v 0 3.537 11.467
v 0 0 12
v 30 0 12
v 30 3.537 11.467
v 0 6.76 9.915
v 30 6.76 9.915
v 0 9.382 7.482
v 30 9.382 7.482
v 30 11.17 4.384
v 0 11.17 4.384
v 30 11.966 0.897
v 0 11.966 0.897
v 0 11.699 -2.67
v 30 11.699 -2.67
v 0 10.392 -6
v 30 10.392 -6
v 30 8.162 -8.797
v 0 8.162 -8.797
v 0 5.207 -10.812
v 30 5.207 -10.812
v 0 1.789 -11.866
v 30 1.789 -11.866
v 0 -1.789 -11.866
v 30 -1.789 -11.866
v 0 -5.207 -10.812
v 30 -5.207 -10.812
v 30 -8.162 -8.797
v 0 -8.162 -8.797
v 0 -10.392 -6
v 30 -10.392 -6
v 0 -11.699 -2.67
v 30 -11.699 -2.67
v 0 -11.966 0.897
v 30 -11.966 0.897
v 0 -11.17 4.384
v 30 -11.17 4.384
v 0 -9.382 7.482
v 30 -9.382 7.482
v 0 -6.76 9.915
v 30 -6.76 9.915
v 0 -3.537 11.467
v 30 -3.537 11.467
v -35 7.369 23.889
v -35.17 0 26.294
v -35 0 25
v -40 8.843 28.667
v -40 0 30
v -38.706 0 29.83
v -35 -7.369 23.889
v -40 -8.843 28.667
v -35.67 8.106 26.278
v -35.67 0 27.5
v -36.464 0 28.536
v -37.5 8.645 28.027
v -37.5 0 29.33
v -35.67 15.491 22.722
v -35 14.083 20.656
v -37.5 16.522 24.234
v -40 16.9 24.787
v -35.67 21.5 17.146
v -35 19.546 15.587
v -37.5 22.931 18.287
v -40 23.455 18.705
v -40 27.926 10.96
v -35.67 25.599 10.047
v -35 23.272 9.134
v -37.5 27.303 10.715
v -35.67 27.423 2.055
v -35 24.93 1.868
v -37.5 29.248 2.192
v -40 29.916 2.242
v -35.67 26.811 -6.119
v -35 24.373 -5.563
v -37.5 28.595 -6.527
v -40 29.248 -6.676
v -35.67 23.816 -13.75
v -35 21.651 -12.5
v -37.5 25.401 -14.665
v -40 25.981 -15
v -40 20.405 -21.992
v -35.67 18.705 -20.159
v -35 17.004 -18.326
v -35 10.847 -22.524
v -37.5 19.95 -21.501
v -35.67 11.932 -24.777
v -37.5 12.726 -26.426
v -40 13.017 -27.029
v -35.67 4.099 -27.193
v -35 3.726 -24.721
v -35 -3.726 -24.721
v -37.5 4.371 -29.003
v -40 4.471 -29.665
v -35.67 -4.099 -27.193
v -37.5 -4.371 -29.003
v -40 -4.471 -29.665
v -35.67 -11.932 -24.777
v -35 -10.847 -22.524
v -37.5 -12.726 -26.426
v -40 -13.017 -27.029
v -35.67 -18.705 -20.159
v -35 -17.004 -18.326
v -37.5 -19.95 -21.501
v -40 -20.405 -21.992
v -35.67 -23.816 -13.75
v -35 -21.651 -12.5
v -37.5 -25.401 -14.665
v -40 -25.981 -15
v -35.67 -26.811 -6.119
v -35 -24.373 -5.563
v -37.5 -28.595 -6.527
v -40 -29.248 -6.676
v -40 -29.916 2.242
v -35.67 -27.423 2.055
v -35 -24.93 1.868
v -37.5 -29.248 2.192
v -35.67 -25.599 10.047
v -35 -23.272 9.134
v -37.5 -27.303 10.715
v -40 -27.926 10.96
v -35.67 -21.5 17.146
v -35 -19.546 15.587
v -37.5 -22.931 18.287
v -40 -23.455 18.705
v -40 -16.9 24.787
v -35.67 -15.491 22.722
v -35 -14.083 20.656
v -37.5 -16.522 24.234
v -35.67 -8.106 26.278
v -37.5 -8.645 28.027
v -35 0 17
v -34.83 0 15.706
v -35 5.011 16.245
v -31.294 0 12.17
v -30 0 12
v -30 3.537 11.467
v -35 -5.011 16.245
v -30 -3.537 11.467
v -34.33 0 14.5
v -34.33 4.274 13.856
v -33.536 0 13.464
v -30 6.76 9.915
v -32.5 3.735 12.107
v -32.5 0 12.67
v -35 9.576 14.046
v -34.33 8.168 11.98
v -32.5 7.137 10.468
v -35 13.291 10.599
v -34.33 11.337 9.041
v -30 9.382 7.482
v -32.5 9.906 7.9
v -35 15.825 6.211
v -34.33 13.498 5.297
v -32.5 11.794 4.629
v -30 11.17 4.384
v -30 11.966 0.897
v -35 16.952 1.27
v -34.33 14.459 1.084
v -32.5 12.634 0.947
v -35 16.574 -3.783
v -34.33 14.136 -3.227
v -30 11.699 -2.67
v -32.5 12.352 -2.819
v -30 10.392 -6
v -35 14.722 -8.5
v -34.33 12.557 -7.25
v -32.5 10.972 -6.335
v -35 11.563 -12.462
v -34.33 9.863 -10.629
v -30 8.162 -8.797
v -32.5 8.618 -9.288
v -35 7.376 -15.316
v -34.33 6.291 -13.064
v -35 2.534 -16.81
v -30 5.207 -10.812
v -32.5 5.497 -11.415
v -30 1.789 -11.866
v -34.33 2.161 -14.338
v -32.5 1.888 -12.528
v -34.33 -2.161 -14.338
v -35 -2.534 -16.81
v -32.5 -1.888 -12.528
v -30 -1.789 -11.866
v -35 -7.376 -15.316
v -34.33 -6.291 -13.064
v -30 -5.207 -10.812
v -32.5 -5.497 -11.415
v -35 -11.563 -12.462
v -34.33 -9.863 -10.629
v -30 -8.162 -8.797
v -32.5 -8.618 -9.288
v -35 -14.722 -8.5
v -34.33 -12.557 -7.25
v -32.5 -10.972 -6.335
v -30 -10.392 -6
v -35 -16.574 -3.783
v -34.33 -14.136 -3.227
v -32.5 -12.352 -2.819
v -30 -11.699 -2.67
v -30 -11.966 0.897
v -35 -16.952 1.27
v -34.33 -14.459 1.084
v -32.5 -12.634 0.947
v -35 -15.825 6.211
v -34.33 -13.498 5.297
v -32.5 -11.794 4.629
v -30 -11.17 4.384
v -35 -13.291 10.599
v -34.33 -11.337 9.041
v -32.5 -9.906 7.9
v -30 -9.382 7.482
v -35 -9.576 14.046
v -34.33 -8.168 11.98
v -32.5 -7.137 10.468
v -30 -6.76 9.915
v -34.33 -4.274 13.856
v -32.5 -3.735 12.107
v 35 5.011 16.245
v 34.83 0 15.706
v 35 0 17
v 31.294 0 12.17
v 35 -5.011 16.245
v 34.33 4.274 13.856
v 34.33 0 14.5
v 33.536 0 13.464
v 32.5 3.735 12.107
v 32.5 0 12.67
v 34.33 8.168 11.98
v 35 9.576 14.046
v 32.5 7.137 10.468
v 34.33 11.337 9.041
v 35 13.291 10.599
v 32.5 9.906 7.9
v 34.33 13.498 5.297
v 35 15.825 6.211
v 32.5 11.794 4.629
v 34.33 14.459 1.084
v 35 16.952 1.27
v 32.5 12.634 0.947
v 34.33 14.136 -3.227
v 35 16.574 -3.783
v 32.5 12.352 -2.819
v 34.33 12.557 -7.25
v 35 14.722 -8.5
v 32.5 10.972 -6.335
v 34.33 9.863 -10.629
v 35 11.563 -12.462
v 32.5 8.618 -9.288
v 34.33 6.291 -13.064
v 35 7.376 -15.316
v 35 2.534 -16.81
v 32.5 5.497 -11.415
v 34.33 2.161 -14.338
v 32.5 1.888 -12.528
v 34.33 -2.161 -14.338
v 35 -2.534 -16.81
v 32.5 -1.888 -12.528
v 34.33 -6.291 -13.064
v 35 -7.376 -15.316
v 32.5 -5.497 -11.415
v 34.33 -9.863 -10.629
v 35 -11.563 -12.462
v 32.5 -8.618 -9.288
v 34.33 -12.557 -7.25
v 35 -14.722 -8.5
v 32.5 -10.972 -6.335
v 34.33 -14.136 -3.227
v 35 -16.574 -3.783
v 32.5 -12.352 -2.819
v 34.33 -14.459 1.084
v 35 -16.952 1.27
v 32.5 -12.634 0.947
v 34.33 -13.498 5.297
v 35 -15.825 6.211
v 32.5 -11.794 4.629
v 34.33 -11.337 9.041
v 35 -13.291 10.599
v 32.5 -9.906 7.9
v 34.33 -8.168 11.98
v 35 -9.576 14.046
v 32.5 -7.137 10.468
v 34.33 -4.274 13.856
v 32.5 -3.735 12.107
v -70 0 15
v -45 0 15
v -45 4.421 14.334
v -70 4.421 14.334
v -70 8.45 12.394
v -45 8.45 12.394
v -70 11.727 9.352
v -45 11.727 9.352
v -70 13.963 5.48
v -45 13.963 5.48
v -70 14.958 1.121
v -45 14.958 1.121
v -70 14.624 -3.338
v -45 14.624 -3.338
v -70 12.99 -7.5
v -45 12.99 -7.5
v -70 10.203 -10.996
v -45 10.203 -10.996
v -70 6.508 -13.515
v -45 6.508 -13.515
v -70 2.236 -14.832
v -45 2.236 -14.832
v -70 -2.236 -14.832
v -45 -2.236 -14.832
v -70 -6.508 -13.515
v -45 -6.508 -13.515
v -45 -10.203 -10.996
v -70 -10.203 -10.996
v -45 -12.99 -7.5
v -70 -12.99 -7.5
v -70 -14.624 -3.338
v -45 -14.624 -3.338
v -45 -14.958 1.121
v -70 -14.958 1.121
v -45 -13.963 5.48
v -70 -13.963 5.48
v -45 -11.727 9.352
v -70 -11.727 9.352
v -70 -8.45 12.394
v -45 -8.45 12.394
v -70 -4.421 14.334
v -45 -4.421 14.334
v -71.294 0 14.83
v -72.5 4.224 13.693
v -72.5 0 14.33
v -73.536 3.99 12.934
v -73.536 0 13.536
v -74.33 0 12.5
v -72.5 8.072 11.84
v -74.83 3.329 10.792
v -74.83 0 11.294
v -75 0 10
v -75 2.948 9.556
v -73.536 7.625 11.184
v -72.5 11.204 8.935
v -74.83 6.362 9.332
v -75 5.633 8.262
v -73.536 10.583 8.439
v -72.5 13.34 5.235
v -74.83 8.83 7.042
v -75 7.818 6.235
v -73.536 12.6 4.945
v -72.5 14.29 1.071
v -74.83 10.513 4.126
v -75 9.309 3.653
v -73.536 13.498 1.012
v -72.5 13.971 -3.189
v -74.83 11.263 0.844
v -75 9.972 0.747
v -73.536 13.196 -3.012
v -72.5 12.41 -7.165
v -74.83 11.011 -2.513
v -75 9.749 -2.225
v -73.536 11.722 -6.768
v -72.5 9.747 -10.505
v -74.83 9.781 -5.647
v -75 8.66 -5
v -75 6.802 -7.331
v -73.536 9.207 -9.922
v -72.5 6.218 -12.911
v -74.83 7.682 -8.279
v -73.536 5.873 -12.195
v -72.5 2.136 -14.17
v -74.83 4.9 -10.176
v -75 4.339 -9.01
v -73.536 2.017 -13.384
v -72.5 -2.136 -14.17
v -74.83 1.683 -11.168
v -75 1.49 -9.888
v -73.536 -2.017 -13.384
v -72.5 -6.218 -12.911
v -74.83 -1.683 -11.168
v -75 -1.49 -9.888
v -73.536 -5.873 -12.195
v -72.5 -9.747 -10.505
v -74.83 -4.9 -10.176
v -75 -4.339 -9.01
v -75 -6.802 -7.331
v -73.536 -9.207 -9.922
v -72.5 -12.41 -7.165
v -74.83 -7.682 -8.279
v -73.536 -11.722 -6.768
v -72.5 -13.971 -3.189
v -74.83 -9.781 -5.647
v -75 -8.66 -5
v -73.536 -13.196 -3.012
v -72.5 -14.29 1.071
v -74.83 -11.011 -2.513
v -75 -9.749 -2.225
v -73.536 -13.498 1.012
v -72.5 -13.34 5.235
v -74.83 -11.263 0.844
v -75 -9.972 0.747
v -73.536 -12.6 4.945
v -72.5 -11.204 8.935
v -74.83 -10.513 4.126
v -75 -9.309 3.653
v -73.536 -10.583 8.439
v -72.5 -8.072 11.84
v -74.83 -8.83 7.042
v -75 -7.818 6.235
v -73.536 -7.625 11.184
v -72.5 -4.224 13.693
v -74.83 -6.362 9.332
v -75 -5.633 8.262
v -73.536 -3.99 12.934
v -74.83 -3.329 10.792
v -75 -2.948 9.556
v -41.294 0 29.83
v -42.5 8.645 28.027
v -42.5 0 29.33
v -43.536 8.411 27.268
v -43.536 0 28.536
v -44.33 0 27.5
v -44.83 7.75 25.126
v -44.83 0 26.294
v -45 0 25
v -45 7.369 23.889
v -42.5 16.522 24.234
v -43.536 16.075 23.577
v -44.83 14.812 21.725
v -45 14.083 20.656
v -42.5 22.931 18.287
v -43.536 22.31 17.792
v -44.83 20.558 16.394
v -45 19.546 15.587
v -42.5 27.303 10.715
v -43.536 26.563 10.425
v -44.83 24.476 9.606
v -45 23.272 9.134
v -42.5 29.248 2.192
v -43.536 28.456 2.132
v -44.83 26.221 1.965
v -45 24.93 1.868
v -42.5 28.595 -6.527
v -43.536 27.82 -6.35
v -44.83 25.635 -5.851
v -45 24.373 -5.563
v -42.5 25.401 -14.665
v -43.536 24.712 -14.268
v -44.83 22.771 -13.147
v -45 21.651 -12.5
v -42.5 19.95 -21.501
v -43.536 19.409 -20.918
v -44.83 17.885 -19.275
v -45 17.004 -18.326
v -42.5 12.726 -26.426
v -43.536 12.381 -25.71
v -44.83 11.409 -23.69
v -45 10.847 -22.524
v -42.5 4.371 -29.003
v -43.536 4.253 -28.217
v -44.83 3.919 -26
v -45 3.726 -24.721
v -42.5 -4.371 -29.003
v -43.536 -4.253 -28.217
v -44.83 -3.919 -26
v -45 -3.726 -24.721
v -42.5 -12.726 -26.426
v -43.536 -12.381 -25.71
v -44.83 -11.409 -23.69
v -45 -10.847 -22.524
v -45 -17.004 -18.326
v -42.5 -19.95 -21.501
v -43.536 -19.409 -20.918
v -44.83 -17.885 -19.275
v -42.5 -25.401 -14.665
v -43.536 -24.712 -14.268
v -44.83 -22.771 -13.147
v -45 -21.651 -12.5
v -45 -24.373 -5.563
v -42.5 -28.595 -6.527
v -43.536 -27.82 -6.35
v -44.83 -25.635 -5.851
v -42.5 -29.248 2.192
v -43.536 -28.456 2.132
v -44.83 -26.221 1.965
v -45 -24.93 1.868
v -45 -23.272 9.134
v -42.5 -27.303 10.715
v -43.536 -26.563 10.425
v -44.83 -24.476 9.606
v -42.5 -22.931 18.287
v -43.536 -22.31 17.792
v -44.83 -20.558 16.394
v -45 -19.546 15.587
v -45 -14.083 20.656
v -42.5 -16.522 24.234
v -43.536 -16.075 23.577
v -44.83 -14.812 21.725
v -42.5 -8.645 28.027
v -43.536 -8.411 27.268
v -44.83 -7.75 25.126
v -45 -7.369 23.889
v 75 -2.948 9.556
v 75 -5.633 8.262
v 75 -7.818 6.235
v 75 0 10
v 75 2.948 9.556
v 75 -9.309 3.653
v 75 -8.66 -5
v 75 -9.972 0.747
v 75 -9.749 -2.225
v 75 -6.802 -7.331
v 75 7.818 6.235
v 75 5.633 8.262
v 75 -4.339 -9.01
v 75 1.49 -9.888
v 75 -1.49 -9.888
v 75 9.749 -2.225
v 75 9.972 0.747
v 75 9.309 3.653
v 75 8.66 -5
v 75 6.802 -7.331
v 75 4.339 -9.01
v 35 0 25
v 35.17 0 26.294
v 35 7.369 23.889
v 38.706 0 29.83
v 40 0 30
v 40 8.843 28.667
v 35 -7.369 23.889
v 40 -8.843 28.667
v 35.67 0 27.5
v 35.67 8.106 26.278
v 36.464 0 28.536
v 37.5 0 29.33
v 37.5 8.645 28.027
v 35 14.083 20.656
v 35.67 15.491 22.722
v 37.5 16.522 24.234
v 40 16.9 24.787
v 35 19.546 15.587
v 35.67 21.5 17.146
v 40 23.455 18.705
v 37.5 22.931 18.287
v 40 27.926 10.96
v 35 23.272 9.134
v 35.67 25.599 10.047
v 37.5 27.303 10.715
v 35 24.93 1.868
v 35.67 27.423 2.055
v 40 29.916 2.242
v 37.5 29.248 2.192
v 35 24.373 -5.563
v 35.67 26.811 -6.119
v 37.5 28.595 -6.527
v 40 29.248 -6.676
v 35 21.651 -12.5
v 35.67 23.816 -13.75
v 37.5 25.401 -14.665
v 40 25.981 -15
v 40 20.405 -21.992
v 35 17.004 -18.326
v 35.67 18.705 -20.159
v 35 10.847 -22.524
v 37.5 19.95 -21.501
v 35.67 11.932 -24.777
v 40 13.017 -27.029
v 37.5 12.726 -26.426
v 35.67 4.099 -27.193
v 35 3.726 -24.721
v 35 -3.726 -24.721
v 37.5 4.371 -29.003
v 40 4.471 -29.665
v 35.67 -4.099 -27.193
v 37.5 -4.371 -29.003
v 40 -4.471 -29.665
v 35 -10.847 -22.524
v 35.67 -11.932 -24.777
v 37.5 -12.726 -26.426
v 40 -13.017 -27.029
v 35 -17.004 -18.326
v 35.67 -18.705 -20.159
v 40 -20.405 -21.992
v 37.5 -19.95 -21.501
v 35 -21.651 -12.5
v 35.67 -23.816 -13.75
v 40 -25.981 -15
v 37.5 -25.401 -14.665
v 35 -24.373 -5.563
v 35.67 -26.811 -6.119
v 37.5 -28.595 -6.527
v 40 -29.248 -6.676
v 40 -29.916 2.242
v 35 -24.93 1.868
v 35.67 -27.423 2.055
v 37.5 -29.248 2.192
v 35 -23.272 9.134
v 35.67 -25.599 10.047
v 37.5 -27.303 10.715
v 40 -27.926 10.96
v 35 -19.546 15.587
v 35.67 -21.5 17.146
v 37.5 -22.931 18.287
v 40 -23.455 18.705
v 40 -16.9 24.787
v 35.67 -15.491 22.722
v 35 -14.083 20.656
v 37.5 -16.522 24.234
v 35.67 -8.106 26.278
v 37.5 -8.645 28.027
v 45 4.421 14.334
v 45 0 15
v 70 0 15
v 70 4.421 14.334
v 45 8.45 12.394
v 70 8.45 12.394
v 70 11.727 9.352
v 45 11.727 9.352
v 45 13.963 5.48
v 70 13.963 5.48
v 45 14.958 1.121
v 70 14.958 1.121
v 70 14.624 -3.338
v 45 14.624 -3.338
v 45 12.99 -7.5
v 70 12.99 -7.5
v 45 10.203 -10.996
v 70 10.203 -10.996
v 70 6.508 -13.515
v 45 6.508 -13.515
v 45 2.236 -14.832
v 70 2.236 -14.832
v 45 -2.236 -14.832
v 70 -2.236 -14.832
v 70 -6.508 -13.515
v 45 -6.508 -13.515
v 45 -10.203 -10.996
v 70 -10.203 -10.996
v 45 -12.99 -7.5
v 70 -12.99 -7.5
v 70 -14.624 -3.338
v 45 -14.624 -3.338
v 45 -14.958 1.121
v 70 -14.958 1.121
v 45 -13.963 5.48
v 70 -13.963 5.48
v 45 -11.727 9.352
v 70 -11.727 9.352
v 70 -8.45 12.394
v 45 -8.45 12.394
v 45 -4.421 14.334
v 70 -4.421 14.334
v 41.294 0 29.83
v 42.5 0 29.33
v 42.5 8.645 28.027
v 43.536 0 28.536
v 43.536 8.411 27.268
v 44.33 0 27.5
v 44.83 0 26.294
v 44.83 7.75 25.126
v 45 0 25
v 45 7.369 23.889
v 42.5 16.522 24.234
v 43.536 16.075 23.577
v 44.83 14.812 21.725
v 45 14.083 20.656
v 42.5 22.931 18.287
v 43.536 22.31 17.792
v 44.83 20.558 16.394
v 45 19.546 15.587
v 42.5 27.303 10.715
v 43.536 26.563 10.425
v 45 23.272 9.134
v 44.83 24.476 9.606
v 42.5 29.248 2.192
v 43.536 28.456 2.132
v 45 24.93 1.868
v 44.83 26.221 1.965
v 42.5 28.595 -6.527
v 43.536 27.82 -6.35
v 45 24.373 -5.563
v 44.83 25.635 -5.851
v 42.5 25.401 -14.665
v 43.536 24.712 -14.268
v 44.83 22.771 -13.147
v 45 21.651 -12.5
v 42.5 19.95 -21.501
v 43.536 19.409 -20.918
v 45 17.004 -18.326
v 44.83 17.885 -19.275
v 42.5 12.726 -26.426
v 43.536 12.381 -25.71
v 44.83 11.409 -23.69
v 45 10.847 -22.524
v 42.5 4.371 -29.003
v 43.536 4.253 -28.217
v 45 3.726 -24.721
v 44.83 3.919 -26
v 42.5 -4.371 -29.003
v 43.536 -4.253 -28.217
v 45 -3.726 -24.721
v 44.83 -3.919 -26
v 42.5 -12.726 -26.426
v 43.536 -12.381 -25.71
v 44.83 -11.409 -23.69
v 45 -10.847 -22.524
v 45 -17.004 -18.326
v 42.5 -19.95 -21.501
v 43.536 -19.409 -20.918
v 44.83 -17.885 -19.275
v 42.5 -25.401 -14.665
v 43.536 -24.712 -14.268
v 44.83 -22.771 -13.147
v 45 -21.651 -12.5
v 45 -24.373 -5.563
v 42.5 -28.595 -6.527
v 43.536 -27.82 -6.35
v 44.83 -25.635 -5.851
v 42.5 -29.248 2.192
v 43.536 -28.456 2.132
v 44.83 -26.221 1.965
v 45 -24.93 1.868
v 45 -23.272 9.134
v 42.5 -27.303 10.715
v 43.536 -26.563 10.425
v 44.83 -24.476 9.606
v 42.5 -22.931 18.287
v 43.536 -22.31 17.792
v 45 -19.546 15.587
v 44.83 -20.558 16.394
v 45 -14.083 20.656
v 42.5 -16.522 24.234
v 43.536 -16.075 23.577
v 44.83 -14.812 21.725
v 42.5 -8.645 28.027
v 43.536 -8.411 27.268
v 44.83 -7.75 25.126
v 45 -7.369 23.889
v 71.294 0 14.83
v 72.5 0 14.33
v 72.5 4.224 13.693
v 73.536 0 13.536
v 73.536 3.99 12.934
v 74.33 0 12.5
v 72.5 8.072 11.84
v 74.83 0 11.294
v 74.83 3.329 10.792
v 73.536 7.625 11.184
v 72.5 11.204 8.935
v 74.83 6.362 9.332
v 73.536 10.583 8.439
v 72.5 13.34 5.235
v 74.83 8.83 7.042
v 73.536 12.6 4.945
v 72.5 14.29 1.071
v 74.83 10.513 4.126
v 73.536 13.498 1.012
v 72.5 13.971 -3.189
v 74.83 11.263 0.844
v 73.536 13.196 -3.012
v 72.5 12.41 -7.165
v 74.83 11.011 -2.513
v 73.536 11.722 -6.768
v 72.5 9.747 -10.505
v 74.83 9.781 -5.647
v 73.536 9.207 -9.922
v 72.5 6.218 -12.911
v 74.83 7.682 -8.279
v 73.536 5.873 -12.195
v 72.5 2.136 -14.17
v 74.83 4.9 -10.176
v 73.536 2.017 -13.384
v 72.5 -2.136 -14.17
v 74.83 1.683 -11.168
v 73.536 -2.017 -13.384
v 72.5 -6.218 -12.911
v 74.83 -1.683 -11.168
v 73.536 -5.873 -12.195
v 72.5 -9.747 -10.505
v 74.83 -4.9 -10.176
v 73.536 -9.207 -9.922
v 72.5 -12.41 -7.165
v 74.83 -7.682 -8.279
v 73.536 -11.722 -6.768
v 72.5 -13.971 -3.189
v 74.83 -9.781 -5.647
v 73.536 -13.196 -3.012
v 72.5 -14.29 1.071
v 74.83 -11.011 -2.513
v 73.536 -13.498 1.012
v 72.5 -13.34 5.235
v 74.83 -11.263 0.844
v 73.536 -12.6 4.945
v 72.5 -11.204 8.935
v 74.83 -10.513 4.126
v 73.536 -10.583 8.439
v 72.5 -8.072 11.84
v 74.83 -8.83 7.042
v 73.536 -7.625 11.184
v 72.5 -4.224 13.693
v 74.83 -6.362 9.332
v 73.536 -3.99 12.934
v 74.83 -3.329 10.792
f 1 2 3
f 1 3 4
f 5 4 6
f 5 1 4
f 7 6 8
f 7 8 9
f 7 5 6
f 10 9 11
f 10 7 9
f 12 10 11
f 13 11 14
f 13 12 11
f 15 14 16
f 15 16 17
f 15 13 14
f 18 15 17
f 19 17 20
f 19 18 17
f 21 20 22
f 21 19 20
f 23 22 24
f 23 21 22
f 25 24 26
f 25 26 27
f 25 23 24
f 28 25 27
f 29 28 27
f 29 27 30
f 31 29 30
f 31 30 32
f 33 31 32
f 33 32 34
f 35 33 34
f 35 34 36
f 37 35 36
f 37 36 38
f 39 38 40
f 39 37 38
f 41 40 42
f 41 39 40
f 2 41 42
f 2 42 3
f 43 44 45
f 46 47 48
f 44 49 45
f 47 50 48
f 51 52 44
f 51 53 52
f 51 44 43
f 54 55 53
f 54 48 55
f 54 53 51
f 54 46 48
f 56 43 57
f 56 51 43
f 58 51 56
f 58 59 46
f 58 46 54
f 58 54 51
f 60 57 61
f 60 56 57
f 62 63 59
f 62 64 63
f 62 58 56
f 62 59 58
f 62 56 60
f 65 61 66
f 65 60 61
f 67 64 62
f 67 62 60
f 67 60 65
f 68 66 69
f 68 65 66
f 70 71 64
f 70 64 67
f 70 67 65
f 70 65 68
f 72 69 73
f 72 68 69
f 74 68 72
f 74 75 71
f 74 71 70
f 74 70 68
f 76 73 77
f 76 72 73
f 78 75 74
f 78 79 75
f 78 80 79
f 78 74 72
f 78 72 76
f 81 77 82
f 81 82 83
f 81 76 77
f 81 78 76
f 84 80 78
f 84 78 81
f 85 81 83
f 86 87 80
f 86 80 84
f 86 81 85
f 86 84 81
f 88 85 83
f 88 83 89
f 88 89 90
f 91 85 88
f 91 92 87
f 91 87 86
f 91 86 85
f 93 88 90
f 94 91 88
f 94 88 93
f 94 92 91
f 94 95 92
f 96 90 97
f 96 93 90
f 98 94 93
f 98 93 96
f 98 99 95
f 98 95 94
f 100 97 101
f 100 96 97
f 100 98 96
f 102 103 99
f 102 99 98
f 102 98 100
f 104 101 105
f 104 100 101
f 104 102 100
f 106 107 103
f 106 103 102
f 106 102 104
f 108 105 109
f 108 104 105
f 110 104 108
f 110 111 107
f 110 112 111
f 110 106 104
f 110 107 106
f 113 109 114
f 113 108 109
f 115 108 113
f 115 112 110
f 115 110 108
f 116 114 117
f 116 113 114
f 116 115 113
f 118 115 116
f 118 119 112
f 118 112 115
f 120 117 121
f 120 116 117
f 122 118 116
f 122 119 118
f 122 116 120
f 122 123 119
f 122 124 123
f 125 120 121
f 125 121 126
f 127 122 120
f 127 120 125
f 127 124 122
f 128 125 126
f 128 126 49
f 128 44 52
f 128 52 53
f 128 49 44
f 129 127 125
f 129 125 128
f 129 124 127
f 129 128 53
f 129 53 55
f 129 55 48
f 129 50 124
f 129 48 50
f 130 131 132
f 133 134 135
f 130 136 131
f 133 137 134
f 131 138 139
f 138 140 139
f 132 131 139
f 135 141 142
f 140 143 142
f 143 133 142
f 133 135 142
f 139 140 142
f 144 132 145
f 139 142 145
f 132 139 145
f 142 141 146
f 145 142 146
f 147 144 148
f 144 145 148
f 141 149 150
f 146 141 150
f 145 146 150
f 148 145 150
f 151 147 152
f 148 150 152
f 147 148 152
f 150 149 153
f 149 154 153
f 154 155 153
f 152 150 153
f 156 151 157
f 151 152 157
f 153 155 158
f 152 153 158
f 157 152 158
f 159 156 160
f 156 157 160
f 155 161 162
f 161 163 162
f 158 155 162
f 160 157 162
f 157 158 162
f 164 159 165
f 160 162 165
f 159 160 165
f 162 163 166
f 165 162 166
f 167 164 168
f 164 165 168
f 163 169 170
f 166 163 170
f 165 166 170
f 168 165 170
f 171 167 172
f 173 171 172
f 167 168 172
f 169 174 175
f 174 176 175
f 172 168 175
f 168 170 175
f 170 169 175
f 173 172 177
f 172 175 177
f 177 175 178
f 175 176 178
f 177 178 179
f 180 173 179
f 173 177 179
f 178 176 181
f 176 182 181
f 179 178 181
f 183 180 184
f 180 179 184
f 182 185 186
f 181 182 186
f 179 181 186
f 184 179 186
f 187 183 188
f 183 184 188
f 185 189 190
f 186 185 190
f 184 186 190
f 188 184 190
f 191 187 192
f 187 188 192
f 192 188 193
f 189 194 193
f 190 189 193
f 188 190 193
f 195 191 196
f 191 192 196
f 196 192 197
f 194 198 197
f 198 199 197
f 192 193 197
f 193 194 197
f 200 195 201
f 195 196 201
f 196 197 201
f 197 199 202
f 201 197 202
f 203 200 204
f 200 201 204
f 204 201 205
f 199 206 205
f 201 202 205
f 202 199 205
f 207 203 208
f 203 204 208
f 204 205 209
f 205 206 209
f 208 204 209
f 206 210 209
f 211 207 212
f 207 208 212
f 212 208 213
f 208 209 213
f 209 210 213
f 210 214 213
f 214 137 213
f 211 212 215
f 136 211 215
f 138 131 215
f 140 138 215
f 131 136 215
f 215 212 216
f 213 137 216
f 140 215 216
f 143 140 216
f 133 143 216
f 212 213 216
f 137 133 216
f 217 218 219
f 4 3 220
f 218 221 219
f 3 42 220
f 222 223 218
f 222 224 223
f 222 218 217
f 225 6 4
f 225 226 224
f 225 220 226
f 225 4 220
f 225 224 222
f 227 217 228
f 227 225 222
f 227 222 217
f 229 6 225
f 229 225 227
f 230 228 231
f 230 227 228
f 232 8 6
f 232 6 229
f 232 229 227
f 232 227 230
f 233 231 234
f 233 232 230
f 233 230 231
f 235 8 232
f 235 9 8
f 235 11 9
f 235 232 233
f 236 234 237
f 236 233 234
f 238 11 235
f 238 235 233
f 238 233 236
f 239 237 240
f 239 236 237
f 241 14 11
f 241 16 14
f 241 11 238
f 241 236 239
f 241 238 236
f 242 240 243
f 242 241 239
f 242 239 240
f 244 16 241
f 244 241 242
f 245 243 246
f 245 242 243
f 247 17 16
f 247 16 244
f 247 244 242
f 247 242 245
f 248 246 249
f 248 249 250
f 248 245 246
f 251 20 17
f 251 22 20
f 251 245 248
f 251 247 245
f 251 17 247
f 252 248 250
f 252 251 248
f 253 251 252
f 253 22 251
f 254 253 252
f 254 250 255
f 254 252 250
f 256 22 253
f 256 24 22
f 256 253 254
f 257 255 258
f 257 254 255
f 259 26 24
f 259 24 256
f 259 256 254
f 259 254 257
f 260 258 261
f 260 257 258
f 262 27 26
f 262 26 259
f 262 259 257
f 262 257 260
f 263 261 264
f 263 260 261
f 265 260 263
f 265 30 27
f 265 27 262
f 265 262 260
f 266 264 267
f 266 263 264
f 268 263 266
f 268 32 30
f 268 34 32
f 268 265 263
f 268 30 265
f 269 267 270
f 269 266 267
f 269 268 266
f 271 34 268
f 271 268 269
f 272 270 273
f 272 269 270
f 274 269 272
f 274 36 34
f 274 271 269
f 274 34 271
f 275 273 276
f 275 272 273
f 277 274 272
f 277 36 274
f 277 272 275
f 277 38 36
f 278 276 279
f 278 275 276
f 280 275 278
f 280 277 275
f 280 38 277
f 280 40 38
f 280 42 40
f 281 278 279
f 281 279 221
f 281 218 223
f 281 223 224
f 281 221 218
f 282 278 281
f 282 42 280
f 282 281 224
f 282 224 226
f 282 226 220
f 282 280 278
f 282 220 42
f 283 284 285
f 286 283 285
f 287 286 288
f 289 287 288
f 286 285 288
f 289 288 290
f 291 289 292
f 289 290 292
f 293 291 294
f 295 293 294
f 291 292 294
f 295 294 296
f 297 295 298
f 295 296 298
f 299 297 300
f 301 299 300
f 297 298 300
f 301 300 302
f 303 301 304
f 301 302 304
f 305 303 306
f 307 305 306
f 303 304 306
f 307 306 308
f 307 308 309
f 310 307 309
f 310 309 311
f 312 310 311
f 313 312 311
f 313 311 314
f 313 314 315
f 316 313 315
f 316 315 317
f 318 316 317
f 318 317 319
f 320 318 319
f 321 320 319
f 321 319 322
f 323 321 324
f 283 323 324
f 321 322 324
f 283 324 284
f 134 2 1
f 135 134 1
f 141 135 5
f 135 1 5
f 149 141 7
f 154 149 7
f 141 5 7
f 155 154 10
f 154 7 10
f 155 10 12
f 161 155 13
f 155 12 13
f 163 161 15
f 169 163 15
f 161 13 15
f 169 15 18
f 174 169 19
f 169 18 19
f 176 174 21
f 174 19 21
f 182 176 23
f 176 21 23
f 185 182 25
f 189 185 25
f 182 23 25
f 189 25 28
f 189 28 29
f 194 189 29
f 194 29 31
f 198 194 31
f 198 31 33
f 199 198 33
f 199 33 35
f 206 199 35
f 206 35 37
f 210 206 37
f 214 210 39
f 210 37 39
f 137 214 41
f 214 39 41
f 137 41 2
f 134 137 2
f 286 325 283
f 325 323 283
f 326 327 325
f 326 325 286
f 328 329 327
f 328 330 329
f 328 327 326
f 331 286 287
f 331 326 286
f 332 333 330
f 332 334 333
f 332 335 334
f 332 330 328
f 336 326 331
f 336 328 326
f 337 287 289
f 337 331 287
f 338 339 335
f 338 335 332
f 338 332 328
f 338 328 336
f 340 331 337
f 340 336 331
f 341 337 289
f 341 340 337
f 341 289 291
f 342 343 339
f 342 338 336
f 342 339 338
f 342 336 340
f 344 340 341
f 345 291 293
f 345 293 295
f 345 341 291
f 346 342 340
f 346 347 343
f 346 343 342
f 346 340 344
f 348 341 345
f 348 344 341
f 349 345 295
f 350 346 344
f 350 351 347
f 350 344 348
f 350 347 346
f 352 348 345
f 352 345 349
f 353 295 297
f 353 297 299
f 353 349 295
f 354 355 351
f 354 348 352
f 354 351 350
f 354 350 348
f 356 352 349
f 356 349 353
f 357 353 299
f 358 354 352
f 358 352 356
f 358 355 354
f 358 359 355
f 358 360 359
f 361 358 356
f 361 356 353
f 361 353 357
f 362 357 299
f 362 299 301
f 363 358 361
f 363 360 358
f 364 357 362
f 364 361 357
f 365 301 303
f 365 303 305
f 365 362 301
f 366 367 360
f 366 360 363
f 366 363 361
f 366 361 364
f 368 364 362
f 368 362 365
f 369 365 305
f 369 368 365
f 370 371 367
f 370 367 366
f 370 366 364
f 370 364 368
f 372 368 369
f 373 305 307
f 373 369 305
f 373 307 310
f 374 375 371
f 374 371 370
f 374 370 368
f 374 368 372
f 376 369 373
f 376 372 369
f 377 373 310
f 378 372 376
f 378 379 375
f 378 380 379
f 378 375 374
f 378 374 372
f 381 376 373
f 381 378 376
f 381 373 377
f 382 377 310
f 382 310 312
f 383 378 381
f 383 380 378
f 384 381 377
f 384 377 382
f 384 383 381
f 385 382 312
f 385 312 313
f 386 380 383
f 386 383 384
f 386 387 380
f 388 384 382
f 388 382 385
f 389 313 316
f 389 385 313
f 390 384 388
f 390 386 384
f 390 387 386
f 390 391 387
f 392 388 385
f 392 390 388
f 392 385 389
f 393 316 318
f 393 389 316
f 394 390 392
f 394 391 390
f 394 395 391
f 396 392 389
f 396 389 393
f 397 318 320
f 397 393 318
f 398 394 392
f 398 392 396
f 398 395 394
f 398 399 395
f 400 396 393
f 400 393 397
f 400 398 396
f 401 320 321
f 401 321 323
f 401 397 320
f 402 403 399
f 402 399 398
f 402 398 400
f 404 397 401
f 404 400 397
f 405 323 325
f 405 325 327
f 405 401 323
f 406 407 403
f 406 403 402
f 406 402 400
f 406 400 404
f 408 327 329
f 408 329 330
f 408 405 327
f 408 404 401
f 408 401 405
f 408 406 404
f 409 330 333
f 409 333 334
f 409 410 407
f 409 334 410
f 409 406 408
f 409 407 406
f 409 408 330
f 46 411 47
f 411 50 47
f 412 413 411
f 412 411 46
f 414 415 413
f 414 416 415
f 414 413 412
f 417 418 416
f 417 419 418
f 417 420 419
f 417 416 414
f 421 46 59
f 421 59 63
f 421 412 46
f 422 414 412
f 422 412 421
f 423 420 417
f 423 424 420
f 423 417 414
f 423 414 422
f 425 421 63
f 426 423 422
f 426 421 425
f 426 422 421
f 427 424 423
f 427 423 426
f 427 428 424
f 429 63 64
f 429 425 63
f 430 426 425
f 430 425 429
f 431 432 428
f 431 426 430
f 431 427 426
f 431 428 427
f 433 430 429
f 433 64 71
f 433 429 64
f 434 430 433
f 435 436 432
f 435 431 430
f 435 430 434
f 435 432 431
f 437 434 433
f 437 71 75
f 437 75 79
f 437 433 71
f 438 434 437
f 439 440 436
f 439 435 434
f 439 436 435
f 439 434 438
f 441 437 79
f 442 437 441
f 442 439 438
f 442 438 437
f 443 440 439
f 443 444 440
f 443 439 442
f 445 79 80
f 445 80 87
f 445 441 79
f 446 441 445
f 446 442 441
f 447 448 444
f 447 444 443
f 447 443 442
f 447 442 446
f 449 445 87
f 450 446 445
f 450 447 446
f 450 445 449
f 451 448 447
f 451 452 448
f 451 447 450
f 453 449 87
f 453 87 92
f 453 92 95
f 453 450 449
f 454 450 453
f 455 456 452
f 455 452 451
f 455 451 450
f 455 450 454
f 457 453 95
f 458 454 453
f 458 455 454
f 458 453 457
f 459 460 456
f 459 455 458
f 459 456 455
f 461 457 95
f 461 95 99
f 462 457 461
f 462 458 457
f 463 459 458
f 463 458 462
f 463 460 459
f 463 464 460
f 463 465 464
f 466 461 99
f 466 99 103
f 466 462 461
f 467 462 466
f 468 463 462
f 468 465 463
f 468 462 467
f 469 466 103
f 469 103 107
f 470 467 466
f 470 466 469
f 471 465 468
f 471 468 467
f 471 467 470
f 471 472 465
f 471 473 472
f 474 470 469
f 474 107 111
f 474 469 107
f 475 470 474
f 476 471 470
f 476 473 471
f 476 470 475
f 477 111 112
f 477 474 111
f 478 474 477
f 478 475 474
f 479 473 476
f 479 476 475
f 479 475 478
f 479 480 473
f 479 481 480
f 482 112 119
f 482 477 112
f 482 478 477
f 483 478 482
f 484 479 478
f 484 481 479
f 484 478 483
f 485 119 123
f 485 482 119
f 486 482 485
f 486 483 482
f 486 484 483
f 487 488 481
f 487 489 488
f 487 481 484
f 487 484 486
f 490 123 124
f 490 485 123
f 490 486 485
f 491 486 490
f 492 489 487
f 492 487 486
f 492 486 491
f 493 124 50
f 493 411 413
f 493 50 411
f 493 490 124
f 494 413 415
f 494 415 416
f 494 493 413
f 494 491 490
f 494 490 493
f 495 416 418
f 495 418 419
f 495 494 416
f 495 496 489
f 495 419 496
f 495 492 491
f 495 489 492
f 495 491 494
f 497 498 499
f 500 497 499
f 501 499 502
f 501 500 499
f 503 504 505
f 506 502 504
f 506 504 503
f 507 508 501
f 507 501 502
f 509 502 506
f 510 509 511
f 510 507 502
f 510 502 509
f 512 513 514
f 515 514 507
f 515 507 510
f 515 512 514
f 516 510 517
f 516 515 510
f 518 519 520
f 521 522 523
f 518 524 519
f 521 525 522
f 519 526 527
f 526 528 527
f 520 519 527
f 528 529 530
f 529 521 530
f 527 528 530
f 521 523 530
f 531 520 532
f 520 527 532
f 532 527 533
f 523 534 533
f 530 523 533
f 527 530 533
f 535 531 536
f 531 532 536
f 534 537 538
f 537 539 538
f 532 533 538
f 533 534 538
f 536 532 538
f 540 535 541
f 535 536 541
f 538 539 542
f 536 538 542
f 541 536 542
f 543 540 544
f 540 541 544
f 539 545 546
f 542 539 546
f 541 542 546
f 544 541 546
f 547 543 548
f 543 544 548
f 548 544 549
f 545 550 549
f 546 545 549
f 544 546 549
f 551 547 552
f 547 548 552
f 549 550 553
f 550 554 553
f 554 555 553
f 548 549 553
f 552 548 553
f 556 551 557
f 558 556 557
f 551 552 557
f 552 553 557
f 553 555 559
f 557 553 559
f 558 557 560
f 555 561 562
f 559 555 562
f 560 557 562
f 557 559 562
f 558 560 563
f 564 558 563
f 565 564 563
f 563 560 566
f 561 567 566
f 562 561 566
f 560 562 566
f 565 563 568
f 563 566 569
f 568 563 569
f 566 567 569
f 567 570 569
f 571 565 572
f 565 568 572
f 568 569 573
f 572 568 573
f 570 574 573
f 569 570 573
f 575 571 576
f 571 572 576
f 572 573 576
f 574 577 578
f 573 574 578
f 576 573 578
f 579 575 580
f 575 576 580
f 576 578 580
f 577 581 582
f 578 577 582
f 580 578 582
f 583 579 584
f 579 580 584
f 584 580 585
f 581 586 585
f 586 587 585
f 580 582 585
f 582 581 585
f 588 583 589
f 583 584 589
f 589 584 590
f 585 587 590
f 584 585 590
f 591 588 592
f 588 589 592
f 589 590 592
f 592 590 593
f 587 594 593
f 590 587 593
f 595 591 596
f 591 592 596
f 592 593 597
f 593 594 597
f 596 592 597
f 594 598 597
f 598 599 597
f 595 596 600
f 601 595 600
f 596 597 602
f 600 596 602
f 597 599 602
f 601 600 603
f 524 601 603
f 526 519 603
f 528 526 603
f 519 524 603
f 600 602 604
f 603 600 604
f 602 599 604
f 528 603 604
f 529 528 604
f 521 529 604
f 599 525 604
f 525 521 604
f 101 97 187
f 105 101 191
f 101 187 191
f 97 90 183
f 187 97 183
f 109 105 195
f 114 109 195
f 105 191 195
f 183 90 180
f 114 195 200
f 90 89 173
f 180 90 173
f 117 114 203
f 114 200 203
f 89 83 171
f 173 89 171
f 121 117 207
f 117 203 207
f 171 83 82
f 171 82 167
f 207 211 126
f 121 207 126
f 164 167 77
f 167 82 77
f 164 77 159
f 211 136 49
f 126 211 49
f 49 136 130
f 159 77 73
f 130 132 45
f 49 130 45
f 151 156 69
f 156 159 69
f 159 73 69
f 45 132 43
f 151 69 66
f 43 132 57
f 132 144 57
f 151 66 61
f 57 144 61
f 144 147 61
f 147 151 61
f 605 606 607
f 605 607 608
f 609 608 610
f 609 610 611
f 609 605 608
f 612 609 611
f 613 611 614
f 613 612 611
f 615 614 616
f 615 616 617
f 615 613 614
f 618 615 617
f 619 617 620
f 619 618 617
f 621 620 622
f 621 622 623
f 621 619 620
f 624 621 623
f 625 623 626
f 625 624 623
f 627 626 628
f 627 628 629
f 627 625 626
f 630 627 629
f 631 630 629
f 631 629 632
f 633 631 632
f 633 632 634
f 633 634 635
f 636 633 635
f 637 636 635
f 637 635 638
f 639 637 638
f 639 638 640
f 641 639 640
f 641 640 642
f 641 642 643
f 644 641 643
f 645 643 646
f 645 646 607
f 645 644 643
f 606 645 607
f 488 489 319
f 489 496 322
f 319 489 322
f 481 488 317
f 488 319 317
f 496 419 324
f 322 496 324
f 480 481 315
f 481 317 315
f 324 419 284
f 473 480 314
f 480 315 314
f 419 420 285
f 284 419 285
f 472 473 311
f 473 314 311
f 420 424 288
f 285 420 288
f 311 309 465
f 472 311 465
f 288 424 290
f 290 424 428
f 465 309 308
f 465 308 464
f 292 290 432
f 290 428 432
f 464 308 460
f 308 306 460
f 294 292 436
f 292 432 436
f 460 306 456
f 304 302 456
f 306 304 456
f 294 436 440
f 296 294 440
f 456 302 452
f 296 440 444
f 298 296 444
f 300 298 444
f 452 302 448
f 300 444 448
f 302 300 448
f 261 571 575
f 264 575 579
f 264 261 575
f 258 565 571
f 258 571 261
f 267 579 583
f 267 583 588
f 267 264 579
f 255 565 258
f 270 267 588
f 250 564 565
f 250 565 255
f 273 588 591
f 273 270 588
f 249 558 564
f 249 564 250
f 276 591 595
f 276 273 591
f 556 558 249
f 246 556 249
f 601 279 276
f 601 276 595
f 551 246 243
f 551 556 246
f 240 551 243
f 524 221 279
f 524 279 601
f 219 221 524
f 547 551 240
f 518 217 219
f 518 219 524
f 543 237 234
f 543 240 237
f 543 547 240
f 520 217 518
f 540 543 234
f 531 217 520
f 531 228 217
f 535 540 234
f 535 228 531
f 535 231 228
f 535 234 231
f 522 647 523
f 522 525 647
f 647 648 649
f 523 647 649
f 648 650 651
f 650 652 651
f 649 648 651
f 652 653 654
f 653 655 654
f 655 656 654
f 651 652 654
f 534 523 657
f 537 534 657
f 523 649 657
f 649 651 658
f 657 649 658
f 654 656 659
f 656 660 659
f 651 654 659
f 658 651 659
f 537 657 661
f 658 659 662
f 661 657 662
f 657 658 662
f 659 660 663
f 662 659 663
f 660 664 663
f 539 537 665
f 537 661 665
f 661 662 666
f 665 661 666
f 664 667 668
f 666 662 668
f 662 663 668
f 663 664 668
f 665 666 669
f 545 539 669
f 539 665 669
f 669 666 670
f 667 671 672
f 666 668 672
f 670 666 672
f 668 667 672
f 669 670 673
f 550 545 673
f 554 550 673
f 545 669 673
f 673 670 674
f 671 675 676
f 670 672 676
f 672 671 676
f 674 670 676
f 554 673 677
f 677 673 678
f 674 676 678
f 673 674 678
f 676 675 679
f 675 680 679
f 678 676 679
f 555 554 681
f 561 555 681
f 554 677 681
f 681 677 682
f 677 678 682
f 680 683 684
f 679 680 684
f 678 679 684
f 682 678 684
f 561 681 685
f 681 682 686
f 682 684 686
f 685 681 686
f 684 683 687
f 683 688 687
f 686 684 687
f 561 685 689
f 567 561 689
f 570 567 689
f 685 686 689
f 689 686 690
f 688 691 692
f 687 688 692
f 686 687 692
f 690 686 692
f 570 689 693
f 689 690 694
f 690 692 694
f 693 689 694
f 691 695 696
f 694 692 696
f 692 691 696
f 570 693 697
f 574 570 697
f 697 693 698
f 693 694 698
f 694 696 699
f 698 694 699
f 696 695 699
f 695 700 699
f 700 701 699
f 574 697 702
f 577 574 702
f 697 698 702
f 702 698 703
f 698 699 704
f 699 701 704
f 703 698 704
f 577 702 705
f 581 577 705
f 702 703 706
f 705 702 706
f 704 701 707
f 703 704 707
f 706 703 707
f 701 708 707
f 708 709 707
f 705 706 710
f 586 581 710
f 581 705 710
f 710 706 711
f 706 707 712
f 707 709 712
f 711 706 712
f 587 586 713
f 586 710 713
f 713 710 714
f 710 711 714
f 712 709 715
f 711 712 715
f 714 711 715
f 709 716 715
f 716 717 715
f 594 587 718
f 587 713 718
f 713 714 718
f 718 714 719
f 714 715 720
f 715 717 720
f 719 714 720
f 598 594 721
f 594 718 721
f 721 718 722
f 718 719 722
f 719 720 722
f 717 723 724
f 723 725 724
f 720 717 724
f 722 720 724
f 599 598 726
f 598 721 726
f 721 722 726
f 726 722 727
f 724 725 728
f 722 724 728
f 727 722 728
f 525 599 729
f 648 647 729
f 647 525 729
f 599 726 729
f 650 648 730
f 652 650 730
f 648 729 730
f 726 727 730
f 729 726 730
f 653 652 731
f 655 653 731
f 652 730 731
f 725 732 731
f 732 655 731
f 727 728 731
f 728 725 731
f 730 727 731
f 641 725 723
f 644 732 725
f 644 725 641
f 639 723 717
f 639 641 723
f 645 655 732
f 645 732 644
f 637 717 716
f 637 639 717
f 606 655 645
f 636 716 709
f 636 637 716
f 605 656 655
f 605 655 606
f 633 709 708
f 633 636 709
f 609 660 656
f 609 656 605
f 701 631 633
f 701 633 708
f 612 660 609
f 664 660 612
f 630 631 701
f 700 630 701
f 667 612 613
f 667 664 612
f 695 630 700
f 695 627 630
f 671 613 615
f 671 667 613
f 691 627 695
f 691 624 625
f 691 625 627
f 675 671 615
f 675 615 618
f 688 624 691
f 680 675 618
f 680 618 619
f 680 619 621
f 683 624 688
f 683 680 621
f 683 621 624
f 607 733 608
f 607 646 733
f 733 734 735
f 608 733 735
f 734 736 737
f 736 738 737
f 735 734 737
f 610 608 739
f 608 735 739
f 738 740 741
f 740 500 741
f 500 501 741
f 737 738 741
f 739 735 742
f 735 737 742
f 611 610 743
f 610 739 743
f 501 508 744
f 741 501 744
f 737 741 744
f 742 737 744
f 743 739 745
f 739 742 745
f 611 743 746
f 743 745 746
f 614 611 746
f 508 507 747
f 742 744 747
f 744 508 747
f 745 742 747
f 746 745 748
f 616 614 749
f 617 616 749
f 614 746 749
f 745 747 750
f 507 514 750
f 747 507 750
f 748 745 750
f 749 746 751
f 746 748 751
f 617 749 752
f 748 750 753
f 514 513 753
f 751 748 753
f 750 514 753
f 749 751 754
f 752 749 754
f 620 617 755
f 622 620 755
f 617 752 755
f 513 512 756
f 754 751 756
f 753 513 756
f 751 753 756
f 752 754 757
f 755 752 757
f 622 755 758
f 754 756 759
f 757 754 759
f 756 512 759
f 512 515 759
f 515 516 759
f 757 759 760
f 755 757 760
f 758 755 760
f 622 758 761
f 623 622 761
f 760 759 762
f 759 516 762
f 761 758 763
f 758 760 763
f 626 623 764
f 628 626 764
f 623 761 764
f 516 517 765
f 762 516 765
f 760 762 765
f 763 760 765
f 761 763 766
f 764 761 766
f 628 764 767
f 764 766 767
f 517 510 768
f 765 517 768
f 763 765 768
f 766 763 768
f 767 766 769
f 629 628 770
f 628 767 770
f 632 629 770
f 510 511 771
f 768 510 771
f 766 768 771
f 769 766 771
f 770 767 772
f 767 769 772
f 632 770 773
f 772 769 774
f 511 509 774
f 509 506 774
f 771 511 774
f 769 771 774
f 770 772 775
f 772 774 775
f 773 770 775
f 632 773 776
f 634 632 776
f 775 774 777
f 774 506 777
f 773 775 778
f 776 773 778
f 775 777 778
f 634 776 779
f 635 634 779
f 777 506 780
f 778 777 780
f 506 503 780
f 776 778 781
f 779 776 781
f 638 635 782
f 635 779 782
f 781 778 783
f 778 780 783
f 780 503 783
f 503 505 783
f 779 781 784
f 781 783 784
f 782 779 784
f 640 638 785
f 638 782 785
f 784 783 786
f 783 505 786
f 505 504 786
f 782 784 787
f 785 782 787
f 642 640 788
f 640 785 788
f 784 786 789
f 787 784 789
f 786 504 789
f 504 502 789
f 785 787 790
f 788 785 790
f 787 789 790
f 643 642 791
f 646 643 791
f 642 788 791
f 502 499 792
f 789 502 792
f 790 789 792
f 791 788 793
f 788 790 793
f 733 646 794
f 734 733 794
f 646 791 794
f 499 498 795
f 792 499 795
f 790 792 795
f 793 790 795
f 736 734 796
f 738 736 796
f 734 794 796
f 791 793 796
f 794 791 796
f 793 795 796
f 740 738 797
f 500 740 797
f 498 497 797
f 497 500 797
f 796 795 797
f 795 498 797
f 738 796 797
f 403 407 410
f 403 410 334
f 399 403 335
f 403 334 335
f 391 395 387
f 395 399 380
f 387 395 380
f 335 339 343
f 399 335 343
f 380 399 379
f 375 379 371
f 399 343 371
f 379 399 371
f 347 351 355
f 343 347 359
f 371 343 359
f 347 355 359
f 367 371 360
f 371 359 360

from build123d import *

# Parameters (mm, degrees)
F3_R = 4.99999


# Not quite as in the source:
# - a fillet or chamfer is up to 0.001 mm smaller than in the source, because OpenCascade refuses the exact size


with BuildPart() as f1:
    # F0 (on Front) → F1 (revolve)
    with BuildSketch(Plane.XZ):
        with BuildLine():
            Line((30, 12), (0, 12))
            Line((0, 12), (0, 0))
            Line((0, 0), (75, 0))
            Line((75, 0), (75, 15))
            Line((75, 15), (45, 15))
            Line((45, 15), (45, 30))
            Line((45, 30), (35, 30))
            Line((35, 30), (35, 17))
            ThreePointArc((35, 17), (33.5355339059, 13.4644660941), (30, 12))
        make_face()
    revolve(axis=Axis((37.5, 0, 0), (-1, 0, 0)))

    # F2: F1 across face


with BuildPart() as f1_1:
    add(f1.part)
    add(f1.part.mirror(Plane(origin=(0, 0, 0), x_dir=(0, -1, 0), z_dir=(-1, 0, 0))))

    # F3 (radius 5 in the source; OpenCascade refuses exactly that, so slightly less here)
    f3_edges = [f1_1.edges().sort_by_distance(p)[0] for p in [
        (75, 0, -15),
        (-75, 0, -15),
        (-35, 0, -30),
        (-45, 0, -30),
        (45, 0, -30),
        (35, 0, -30),
        (30, 0, -12),
        (0, 0, 12),
        (-30, 0, -12),
    ]]
    fillet(f3_edges, radius=F3_R)


solid = f1_1.part
